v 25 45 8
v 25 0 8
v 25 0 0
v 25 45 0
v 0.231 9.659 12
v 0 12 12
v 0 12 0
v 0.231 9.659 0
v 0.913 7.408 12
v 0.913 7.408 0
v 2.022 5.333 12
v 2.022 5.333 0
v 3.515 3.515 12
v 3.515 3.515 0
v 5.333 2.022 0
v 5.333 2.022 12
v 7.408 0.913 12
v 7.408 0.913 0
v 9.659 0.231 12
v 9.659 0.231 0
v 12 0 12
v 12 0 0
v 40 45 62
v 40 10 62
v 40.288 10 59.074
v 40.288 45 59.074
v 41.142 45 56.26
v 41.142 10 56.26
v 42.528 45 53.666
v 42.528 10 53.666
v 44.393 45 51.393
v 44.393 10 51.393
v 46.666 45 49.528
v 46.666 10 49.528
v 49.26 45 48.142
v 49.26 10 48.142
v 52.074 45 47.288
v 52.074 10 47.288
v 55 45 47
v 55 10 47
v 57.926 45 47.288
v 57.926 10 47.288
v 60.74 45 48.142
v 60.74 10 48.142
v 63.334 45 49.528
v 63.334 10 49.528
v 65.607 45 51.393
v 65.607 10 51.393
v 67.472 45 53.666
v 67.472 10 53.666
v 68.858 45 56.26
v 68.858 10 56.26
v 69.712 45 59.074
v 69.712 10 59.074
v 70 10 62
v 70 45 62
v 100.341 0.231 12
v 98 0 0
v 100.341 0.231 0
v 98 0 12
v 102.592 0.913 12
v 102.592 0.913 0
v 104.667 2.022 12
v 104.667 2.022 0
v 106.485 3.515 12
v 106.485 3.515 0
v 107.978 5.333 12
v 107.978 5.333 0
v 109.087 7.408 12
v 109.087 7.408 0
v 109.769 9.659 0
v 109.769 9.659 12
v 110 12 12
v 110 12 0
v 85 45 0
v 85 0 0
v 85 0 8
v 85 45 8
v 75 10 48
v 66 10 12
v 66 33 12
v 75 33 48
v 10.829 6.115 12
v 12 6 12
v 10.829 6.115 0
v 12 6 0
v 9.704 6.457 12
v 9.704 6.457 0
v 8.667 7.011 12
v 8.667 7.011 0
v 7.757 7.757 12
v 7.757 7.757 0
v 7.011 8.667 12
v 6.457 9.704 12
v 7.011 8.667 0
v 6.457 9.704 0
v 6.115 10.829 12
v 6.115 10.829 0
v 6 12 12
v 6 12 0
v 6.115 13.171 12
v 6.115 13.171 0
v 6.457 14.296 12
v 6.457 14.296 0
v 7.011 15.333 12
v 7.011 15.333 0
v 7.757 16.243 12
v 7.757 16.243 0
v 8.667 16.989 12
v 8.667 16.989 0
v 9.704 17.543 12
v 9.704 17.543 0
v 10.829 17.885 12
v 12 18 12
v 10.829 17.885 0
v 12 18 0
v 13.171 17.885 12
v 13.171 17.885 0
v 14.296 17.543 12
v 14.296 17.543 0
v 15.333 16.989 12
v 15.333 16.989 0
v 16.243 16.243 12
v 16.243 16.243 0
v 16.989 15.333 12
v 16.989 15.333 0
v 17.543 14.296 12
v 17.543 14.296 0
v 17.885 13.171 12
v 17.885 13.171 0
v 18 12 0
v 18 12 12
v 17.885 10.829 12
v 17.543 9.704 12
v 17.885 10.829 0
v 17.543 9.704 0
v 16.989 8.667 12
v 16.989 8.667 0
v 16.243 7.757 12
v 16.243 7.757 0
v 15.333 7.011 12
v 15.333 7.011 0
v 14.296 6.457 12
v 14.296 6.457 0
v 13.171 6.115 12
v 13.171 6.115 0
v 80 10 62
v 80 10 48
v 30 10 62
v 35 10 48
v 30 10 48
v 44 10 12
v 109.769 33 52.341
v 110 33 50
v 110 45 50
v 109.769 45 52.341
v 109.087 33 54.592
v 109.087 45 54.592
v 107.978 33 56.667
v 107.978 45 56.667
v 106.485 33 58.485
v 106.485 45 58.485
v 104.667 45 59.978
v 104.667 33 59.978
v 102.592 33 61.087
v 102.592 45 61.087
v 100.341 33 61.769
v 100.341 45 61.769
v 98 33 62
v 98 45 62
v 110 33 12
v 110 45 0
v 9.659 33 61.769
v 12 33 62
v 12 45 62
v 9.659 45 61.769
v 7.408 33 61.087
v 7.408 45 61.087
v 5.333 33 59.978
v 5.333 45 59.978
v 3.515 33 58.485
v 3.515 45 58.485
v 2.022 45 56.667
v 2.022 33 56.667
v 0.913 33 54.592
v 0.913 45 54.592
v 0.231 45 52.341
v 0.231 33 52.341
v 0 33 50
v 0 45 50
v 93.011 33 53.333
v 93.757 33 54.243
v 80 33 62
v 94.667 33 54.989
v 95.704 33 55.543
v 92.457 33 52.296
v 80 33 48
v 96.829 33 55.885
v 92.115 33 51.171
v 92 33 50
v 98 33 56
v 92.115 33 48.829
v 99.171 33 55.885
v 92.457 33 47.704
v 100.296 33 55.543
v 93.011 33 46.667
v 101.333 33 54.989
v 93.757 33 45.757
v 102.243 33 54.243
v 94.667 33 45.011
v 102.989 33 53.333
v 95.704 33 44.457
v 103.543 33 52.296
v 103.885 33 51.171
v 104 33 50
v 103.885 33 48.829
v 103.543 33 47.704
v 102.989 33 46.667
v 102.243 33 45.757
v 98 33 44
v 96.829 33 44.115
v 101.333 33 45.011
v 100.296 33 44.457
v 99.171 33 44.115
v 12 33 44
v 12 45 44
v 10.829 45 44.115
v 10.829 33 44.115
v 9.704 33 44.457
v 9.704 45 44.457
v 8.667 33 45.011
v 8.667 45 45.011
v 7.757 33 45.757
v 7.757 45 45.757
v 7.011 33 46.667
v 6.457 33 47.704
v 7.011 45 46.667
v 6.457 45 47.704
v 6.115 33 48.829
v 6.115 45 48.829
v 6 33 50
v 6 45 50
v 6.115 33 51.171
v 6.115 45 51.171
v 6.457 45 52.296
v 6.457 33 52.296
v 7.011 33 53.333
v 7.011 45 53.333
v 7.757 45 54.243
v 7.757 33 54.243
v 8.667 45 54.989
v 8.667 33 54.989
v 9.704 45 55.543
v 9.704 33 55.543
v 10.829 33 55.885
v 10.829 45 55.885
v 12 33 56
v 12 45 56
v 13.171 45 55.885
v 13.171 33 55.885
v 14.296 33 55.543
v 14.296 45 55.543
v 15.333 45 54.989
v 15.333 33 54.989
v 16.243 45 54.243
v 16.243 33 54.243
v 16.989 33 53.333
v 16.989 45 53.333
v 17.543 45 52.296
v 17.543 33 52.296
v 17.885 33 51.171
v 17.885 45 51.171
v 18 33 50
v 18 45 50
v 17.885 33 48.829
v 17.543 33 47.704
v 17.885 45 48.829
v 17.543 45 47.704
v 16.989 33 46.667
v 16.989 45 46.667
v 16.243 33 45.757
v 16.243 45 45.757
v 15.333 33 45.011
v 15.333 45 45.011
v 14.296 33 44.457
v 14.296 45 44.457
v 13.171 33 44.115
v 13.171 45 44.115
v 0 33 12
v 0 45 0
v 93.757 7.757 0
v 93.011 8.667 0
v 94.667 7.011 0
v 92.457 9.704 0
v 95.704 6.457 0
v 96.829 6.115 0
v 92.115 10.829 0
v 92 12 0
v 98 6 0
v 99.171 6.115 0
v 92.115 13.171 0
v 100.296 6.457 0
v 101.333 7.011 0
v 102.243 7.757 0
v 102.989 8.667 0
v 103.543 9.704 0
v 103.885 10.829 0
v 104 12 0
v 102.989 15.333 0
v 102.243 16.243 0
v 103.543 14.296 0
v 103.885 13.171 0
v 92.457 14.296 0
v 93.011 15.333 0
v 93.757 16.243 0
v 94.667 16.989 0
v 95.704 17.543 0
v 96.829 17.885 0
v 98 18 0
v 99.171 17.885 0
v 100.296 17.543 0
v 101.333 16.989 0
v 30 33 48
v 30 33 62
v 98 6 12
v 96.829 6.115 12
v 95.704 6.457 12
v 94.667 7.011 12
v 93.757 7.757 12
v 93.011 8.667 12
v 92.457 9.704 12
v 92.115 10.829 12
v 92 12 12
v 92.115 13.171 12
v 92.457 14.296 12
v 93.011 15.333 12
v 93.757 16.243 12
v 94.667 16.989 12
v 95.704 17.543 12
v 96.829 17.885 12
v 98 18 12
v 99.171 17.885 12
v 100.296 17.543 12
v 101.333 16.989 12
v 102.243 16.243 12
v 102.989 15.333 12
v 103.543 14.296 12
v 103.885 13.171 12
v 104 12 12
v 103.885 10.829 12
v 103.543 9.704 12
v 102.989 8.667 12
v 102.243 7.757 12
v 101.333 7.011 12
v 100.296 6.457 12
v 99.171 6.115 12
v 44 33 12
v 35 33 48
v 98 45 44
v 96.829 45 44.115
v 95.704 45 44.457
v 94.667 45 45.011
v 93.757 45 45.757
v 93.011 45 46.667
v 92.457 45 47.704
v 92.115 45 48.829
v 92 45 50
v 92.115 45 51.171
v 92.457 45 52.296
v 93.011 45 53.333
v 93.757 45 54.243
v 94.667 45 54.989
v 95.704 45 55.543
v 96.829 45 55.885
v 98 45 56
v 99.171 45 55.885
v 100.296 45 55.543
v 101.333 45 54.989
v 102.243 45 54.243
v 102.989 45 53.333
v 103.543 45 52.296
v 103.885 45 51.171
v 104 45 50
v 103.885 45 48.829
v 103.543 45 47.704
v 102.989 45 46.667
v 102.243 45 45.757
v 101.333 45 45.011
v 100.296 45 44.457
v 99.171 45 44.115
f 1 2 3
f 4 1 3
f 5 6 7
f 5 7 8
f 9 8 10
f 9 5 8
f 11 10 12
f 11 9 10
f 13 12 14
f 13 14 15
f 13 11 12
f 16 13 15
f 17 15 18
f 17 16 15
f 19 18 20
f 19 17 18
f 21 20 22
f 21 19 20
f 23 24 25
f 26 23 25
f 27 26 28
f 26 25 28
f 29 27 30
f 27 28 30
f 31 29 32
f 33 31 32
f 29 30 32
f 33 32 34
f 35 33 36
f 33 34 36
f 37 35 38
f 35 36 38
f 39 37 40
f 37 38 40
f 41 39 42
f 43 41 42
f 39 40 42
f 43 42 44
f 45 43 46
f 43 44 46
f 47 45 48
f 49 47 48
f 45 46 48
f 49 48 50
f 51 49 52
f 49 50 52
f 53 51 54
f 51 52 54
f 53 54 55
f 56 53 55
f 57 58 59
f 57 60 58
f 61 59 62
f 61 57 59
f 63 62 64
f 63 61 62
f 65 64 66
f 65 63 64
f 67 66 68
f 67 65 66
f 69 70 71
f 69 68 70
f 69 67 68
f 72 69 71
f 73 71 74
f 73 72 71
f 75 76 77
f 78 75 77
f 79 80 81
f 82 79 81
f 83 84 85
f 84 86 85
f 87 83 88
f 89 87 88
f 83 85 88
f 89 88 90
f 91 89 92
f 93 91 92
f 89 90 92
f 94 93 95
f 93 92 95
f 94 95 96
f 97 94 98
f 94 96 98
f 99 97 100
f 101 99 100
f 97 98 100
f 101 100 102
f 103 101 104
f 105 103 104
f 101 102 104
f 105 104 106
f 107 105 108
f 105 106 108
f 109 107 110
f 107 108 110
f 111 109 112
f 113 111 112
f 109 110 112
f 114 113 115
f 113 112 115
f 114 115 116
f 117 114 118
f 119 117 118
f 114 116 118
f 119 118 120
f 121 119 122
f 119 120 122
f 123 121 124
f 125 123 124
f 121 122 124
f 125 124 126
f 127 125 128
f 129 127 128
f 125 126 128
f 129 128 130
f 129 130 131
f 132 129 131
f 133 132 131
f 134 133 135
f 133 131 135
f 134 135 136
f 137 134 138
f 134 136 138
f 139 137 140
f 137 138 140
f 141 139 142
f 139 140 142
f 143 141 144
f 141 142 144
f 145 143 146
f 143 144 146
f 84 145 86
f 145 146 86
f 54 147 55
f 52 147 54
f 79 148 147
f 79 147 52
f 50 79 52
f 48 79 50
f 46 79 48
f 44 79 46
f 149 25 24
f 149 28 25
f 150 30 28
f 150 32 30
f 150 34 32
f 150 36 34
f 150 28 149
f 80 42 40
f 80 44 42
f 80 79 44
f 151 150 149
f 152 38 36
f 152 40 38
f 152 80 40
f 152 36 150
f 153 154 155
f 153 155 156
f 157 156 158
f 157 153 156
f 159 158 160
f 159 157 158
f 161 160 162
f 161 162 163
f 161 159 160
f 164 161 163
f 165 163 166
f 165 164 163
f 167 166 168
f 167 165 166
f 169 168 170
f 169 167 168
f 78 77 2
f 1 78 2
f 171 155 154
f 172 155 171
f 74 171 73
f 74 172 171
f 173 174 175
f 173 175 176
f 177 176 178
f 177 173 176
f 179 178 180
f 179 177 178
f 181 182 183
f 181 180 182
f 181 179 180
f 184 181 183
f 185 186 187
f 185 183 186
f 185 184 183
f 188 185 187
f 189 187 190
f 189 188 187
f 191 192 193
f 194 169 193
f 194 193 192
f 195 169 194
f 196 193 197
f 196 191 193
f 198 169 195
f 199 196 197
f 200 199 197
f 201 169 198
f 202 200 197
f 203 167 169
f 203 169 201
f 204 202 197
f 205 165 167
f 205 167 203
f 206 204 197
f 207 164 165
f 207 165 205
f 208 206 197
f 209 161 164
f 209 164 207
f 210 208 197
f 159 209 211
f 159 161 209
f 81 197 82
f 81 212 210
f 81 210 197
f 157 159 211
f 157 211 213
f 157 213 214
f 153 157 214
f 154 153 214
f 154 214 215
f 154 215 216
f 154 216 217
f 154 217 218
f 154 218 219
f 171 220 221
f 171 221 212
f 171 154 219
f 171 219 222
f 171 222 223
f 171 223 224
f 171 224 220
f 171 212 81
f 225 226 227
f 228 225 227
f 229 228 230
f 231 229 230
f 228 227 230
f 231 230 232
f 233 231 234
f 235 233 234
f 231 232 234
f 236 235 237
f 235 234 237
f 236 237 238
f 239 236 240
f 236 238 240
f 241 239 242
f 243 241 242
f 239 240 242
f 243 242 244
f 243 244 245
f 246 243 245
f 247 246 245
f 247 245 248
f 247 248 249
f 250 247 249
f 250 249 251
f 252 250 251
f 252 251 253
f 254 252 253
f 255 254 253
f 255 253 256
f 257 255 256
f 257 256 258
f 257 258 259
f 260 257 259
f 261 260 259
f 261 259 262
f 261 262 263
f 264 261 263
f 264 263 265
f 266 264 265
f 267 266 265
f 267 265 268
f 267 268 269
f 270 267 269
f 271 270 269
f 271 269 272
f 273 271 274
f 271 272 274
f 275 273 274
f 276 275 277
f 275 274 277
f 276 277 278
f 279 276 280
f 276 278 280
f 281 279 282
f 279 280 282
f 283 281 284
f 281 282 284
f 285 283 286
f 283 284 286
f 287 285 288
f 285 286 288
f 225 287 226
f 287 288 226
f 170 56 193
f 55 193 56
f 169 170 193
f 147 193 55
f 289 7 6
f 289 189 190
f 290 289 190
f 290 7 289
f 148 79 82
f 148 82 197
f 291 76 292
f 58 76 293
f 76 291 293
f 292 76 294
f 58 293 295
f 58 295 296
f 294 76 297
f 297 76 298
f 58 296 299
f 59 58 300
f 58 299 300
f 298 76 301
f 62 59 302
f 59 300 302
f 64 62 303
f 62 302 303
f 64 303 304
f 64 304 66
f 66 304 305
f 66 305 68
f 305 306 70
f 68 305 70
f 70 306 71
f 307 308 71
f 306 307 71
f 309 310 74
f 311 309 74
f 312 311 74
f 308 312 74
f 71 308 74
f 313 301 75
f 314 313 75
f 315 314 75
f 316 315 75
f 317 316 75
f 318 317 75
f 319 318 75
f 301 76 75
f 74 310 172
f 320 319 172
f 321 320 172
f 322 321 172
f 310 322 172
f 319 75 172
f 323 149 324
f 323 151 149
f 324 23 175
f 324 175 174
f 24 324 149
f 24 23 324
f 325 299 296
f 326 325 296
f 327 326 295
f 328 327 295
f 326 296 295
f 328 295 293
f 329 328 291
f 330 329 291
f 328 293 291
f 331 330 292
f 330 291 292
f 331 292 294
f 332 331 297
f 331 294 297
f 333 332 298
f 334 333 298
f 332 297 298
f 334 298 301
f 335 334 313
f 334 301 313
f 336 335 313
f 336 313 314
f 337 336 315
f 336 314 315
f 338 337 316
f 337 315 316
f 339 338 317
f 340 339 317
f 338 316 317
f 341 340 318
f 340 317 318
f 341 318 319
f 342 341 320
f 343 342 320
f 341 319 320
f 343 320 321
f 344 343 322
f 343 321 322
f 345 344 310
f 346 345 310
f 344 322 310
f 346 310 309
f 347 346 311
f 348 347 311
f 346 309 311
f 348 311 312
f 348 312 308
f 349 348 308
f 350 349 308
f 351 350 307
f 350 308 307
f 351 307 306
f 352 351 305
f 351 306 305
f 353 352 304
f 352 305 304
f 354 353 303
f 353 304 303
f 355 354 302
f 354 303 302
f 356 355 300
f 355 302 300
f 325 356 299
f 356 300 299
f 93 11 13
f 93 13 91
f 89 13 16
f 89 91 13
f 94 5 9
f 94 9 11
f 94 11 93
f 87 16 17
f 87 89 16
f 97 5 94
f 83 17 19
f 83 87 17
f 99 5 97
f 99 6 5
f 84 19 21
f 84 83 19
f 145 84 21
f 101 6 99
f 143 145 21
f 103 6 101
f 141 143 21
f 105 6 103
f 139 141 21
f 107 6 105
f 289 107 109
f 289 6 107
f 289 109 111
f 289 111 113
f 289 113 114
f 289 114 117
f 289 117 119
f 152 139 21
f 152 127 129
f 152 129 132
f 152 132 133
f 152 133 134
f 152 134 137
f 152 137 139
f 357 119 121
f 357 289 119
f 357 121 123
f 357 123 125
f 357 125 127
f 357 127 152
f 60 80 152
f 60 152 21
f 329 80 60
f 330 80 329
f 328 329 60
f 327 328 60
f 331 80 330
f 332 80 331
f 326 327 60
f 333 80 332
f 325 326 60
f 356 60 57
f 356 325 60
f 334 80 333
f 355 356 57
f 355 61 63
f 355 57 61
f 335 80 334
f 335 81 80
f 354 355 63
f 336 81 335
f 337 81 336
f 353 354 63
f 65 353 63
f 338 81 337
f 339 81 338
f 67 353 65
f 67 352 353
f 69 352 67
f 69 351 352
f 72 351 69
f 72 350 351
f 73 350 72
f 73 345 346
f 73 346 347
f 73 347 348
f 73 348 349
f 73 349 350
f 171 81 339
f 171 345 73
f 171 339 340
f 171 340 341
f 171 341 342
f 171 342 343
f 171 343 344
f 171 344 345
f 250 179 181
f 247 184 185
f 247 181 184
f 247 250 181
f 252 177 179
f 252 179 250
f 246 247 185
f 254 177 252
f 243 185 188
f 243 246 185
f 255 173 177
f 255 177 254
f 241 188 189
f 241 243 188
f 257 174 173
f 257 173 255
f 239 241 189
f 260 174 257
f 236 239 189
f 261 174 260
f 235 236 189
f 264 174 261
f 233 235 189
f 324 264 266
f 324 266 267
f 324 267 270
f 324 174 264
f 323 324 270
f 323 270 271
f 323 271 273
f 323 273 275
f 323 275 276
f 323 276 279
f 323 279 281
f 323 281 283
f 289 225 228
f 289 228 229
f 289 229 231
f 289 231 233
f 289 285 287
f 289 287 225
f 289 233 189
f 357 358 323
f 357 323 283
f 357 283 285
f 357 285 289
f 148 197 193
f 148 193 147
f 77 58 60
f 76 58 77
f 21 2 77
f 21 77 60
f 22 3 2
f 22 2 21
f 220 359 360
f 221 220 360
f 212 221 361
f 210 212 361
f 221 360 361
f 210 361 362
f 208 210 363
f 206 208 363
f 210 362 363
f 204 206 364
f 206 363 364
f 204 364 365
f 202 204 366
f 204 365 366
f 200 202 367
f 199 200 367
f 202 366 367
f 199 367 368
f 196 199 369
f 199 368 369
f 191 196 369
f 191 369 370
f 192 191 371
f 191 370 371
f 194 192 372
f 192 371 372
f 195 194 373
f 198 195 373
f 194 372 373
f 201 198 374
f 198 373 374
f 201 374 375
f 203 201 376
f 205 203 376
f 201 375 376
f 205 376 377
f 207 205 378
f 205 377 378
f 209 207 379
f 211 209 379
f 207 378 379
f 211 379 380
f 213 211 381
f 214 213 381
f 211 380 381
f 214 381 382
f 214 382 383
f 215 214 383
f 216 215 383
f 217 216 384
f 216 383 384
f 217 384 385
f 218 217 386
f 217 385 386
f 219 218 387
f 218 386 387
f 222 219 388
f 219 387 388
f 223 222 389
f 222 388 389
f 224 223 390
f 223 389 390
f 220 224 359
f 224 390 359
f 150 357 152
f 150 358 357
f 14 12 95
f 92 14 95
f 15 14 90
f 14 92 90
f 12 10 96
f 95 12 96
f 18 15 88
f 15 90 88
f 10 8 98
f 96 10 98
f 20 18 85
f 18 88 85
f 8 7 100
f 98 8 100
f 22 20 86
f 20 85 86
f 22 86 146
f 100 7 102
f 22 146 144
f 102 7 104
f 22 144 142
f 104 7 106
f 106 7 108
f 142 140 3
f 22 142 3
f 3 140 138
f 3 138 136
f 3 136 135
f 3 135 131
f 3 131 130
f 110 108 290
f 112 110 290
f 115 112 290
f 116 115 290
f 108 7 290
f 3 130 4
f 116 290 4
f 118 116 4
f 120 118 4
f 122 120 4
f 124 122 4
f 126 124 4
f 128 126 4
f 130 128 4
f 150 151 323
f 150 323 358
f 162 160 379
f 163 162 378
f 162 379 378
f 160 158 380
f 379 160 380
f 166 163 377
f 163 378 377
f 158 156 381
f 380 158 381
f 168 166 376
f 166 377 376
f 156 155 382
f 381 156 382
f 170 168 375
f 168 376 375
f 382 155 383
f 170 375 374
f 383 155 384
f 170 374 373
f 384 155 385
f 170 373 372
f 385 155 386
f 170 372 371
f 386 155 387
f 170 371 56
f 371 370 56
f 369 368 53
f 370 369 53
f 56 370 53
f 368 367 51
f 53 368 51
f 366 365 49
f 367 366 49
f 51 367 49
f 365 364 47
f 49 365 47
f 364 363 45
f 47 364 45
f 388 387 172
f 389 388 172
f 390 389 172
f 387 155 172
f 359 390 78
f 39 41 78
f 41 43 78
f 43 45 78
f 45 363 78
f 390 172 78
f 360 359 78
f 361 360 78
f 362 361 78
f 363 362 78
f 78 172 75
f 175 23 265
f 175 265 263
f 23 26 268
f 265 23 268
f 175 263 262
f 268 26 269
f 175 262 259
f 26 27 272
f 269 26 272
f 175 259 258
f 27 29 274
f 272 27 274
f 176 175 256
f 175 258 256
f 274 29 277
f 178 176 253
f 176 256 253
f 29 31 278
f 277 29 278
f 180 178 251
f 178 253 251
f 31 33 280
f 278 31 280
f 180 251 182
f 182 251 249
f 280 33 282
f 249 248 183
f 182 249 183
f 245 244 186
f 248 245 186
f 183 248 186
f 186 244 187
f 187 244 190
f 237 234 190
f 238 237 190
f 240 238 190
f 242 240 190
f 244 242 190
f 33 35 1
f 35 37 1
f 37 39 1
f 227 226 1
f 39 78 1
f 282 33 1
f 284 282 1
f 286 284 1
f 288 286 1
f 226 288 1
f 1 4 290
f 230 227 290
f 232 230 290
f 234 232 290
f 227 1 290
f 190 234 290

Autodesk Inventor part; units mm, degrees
ref_plane "YZ Plane" through (0, 0, 0) normal (1, 0, 0) x (0, 1, 0)
ref_plane "XZ Plane" through (0, 0, 0) normal (0, 1, 0) x (-1, 0, 0)
sketch "Skizze1" plane through (0, 0, 0) normal (0, 0, 1) x (1, 0, 0)
  line L0 (0, 45) -> (110, 45)
  line L1 (110, 45) -> (110, 0)
  line L2 (110, 0) -> (0, 0)
  line L3 (0, 0) -> (0, 45)
  dimension "d0" = 110
  dimension "d1" = 45
extrude "Extrusion1" add sketch "Skizze1" along normal blind 12
sketch "Skizze2" plane through (110, 0, 0) normal (1, 0, 0) x (0, 0, -1)
  line L0 (0, 45) -> (-12, 45) projected
  line L1 (0, 45) -> (-62, 45)
  line L2 (-62, 45) -> (-62, 33)
  line L3 (-62, 33) -> (0, 33)
  line L4 (0, 33) -> (0, 45)
  point P0 (0, 0)
  dimension "d4" = 12
  dimension "d5" = 62
extrude "Extrusion2" add sketch "Skizze2" against normal up to surface (110 mm away)
fillet "Rundung1" radius 12 4 edges at (110, 0, 6) (0, 0, 6) (0, 39, 62) (110, 39, 62)
ref_plane "Arbeitsebene1" through (0, 0, 48) normal (0, 0, 1) x (1, 0, 0)
sketch "Skizze5" plane through (0, 0, 48) normal (0, 0, 1) x (1, 0, 0)
  line L0 (110, 45) -> (0, 45) projected
  line L1 (30, 45) -> (80, 45)
  line L2 (80, 45) -> (80, 10)
  line L3 (80, 10) -> (30, 10)
  line L4 (30, 10) -> (30, 45)
  line L5 (12, 0) -> (98, 0) projected
  point P0 (0, 0)
  point P1 (55, 10)
  point P2 (55, 0)
  dimension "d12" = 50
  dimension "d13" = 35
extrude "Extrusion4" add sketch "Skizze5" along normal up to surface (14 mm away)
sketch "Skizze3" plane through (0, 0, 12) normal (0, 0, 1) x (1, 0, 0)
  line L0 (98, 33) -> (12, 33) projected
  line L1 (44, 33) -> (66, 33)
  line L2 (66, 33) -> (66, 10)
  line L3 (66, 10) -> (44, 10)
  line L4 (44, 10) -> (44, 33)
  line L5 (12, 0) -> (98, 0) projected
  point P0 (0, 0)
  point P1 (55, 10)
  point P2 (55, 0)
  dimension "d9" = 22
  dimension "d10" = 23
sketch "Skizze9" plane through (0, 0, 48) normal (0, 0, -1) x (-1, 0, 0)
  line L0 (-80, 10) -> (-30, 10) projected
  line L1 (-35, 33) -> (-75, 33)
  line L2 (-75, 33) -> (-75, 10)
  line L3 (-75, 10) -> (-35, 10)
  line L4 (-35, 10) -> (-35, 33)
  line L5 (-98, 45) -> (-12, 45) projected
  point P0 (0, 0)
  point P1 (-55, 33)
  point P2 (-55, 45)
  dimension "d30" = 40
  dimension "d31" = 23
loft "Erhebung3" add profiles "Skizze3", "Skizze9"
sketch "Skizze10" plane through (30, 10, 62) normal (0, -1, 0) x (1, 0, 0)
  line L0 (68, 0) -> (-18, 0) projected
  arc A0 (10, 0) -> (40, 0) centre (25, 0) ccw
  line L1 (0, -14) -> (0, 0) projected
  line L2 (50, -14) -> (50, 0) projected
  point P0 (-30, -62)
  dimension "d38" = 30
  dimension "d39" = 10
extrude "Extrusion5" cut sketch "Skizze10" against normal up to surface (35 mm away)
sketch "Skizze11" plane through (0, 33, 12) normal (0, -1, 0) x (1, 0, 0)
  arc A0 (12, 50) -> (0, 38) centre (12, 38) ccw projected
  point P0 (0, -12)
hole "Bohrung1" at (12, 33, 50) direction (0, 1, 0) diameter 12 depth 12
sketch "Skizze12" plane through (110, 33, 12) normal (0, -1, 0) x (1, 0, 0)
  arc A0 (0, 38) -> (-12, 50) centre (-12, 38) ccw projected
  point P0 (-110, -12)
hole "Bohrung2" at (98, 33, 50) direction (0, 1, 0) diameter 12 depth 12
sketch "Skizze13" plane through (0, 0, 12) normal (0, 0, 1) x (1, 0, 0)
  arc A0 (98, 0) -> (110, 12) centre (98, 12) ccw projected
  point P0 (0, 0)
hole "Bohrung3" at (98, 12, 12) direction (0, 0, -1) diameter 12 depth 12
sketch "Skizze14" plane through (0, 0, 12) normal (0, 0, 1) x (1, 0, 0)
  arc A0 (0, 12) -> (12, 0) centre (12, 12) ccw projected
  point P0 (0, 0)
hole "Bohrung4" at (12, 12, 12) direction (0, 0, -1) diameter 12 depth 12
sketch "Skizze15" plane through (12, 0, 0) normal (0, -1, 0) x (1, 0, 0)
  line L0 (0, 0) -> (86, 0) projected
  line L1 (13, 0) -> (73, 0)
  line L2 (73, 0) -> (73, 8)
  line L3 (73, 8) -> (13, 8)
  line L4 (13, 8) -> (13, 0)
  line L5 (-12, 12) -> (-12, 0) projected
  dimension "d70" = 60
  dimension "d71" = 25
  dimension "d72" = 8
extrude "Extrusion6" cut sketch "Skizze15" against normal up to surface (45 mm away)
properties part number "manu" material "Stahl, galvanisiert"
